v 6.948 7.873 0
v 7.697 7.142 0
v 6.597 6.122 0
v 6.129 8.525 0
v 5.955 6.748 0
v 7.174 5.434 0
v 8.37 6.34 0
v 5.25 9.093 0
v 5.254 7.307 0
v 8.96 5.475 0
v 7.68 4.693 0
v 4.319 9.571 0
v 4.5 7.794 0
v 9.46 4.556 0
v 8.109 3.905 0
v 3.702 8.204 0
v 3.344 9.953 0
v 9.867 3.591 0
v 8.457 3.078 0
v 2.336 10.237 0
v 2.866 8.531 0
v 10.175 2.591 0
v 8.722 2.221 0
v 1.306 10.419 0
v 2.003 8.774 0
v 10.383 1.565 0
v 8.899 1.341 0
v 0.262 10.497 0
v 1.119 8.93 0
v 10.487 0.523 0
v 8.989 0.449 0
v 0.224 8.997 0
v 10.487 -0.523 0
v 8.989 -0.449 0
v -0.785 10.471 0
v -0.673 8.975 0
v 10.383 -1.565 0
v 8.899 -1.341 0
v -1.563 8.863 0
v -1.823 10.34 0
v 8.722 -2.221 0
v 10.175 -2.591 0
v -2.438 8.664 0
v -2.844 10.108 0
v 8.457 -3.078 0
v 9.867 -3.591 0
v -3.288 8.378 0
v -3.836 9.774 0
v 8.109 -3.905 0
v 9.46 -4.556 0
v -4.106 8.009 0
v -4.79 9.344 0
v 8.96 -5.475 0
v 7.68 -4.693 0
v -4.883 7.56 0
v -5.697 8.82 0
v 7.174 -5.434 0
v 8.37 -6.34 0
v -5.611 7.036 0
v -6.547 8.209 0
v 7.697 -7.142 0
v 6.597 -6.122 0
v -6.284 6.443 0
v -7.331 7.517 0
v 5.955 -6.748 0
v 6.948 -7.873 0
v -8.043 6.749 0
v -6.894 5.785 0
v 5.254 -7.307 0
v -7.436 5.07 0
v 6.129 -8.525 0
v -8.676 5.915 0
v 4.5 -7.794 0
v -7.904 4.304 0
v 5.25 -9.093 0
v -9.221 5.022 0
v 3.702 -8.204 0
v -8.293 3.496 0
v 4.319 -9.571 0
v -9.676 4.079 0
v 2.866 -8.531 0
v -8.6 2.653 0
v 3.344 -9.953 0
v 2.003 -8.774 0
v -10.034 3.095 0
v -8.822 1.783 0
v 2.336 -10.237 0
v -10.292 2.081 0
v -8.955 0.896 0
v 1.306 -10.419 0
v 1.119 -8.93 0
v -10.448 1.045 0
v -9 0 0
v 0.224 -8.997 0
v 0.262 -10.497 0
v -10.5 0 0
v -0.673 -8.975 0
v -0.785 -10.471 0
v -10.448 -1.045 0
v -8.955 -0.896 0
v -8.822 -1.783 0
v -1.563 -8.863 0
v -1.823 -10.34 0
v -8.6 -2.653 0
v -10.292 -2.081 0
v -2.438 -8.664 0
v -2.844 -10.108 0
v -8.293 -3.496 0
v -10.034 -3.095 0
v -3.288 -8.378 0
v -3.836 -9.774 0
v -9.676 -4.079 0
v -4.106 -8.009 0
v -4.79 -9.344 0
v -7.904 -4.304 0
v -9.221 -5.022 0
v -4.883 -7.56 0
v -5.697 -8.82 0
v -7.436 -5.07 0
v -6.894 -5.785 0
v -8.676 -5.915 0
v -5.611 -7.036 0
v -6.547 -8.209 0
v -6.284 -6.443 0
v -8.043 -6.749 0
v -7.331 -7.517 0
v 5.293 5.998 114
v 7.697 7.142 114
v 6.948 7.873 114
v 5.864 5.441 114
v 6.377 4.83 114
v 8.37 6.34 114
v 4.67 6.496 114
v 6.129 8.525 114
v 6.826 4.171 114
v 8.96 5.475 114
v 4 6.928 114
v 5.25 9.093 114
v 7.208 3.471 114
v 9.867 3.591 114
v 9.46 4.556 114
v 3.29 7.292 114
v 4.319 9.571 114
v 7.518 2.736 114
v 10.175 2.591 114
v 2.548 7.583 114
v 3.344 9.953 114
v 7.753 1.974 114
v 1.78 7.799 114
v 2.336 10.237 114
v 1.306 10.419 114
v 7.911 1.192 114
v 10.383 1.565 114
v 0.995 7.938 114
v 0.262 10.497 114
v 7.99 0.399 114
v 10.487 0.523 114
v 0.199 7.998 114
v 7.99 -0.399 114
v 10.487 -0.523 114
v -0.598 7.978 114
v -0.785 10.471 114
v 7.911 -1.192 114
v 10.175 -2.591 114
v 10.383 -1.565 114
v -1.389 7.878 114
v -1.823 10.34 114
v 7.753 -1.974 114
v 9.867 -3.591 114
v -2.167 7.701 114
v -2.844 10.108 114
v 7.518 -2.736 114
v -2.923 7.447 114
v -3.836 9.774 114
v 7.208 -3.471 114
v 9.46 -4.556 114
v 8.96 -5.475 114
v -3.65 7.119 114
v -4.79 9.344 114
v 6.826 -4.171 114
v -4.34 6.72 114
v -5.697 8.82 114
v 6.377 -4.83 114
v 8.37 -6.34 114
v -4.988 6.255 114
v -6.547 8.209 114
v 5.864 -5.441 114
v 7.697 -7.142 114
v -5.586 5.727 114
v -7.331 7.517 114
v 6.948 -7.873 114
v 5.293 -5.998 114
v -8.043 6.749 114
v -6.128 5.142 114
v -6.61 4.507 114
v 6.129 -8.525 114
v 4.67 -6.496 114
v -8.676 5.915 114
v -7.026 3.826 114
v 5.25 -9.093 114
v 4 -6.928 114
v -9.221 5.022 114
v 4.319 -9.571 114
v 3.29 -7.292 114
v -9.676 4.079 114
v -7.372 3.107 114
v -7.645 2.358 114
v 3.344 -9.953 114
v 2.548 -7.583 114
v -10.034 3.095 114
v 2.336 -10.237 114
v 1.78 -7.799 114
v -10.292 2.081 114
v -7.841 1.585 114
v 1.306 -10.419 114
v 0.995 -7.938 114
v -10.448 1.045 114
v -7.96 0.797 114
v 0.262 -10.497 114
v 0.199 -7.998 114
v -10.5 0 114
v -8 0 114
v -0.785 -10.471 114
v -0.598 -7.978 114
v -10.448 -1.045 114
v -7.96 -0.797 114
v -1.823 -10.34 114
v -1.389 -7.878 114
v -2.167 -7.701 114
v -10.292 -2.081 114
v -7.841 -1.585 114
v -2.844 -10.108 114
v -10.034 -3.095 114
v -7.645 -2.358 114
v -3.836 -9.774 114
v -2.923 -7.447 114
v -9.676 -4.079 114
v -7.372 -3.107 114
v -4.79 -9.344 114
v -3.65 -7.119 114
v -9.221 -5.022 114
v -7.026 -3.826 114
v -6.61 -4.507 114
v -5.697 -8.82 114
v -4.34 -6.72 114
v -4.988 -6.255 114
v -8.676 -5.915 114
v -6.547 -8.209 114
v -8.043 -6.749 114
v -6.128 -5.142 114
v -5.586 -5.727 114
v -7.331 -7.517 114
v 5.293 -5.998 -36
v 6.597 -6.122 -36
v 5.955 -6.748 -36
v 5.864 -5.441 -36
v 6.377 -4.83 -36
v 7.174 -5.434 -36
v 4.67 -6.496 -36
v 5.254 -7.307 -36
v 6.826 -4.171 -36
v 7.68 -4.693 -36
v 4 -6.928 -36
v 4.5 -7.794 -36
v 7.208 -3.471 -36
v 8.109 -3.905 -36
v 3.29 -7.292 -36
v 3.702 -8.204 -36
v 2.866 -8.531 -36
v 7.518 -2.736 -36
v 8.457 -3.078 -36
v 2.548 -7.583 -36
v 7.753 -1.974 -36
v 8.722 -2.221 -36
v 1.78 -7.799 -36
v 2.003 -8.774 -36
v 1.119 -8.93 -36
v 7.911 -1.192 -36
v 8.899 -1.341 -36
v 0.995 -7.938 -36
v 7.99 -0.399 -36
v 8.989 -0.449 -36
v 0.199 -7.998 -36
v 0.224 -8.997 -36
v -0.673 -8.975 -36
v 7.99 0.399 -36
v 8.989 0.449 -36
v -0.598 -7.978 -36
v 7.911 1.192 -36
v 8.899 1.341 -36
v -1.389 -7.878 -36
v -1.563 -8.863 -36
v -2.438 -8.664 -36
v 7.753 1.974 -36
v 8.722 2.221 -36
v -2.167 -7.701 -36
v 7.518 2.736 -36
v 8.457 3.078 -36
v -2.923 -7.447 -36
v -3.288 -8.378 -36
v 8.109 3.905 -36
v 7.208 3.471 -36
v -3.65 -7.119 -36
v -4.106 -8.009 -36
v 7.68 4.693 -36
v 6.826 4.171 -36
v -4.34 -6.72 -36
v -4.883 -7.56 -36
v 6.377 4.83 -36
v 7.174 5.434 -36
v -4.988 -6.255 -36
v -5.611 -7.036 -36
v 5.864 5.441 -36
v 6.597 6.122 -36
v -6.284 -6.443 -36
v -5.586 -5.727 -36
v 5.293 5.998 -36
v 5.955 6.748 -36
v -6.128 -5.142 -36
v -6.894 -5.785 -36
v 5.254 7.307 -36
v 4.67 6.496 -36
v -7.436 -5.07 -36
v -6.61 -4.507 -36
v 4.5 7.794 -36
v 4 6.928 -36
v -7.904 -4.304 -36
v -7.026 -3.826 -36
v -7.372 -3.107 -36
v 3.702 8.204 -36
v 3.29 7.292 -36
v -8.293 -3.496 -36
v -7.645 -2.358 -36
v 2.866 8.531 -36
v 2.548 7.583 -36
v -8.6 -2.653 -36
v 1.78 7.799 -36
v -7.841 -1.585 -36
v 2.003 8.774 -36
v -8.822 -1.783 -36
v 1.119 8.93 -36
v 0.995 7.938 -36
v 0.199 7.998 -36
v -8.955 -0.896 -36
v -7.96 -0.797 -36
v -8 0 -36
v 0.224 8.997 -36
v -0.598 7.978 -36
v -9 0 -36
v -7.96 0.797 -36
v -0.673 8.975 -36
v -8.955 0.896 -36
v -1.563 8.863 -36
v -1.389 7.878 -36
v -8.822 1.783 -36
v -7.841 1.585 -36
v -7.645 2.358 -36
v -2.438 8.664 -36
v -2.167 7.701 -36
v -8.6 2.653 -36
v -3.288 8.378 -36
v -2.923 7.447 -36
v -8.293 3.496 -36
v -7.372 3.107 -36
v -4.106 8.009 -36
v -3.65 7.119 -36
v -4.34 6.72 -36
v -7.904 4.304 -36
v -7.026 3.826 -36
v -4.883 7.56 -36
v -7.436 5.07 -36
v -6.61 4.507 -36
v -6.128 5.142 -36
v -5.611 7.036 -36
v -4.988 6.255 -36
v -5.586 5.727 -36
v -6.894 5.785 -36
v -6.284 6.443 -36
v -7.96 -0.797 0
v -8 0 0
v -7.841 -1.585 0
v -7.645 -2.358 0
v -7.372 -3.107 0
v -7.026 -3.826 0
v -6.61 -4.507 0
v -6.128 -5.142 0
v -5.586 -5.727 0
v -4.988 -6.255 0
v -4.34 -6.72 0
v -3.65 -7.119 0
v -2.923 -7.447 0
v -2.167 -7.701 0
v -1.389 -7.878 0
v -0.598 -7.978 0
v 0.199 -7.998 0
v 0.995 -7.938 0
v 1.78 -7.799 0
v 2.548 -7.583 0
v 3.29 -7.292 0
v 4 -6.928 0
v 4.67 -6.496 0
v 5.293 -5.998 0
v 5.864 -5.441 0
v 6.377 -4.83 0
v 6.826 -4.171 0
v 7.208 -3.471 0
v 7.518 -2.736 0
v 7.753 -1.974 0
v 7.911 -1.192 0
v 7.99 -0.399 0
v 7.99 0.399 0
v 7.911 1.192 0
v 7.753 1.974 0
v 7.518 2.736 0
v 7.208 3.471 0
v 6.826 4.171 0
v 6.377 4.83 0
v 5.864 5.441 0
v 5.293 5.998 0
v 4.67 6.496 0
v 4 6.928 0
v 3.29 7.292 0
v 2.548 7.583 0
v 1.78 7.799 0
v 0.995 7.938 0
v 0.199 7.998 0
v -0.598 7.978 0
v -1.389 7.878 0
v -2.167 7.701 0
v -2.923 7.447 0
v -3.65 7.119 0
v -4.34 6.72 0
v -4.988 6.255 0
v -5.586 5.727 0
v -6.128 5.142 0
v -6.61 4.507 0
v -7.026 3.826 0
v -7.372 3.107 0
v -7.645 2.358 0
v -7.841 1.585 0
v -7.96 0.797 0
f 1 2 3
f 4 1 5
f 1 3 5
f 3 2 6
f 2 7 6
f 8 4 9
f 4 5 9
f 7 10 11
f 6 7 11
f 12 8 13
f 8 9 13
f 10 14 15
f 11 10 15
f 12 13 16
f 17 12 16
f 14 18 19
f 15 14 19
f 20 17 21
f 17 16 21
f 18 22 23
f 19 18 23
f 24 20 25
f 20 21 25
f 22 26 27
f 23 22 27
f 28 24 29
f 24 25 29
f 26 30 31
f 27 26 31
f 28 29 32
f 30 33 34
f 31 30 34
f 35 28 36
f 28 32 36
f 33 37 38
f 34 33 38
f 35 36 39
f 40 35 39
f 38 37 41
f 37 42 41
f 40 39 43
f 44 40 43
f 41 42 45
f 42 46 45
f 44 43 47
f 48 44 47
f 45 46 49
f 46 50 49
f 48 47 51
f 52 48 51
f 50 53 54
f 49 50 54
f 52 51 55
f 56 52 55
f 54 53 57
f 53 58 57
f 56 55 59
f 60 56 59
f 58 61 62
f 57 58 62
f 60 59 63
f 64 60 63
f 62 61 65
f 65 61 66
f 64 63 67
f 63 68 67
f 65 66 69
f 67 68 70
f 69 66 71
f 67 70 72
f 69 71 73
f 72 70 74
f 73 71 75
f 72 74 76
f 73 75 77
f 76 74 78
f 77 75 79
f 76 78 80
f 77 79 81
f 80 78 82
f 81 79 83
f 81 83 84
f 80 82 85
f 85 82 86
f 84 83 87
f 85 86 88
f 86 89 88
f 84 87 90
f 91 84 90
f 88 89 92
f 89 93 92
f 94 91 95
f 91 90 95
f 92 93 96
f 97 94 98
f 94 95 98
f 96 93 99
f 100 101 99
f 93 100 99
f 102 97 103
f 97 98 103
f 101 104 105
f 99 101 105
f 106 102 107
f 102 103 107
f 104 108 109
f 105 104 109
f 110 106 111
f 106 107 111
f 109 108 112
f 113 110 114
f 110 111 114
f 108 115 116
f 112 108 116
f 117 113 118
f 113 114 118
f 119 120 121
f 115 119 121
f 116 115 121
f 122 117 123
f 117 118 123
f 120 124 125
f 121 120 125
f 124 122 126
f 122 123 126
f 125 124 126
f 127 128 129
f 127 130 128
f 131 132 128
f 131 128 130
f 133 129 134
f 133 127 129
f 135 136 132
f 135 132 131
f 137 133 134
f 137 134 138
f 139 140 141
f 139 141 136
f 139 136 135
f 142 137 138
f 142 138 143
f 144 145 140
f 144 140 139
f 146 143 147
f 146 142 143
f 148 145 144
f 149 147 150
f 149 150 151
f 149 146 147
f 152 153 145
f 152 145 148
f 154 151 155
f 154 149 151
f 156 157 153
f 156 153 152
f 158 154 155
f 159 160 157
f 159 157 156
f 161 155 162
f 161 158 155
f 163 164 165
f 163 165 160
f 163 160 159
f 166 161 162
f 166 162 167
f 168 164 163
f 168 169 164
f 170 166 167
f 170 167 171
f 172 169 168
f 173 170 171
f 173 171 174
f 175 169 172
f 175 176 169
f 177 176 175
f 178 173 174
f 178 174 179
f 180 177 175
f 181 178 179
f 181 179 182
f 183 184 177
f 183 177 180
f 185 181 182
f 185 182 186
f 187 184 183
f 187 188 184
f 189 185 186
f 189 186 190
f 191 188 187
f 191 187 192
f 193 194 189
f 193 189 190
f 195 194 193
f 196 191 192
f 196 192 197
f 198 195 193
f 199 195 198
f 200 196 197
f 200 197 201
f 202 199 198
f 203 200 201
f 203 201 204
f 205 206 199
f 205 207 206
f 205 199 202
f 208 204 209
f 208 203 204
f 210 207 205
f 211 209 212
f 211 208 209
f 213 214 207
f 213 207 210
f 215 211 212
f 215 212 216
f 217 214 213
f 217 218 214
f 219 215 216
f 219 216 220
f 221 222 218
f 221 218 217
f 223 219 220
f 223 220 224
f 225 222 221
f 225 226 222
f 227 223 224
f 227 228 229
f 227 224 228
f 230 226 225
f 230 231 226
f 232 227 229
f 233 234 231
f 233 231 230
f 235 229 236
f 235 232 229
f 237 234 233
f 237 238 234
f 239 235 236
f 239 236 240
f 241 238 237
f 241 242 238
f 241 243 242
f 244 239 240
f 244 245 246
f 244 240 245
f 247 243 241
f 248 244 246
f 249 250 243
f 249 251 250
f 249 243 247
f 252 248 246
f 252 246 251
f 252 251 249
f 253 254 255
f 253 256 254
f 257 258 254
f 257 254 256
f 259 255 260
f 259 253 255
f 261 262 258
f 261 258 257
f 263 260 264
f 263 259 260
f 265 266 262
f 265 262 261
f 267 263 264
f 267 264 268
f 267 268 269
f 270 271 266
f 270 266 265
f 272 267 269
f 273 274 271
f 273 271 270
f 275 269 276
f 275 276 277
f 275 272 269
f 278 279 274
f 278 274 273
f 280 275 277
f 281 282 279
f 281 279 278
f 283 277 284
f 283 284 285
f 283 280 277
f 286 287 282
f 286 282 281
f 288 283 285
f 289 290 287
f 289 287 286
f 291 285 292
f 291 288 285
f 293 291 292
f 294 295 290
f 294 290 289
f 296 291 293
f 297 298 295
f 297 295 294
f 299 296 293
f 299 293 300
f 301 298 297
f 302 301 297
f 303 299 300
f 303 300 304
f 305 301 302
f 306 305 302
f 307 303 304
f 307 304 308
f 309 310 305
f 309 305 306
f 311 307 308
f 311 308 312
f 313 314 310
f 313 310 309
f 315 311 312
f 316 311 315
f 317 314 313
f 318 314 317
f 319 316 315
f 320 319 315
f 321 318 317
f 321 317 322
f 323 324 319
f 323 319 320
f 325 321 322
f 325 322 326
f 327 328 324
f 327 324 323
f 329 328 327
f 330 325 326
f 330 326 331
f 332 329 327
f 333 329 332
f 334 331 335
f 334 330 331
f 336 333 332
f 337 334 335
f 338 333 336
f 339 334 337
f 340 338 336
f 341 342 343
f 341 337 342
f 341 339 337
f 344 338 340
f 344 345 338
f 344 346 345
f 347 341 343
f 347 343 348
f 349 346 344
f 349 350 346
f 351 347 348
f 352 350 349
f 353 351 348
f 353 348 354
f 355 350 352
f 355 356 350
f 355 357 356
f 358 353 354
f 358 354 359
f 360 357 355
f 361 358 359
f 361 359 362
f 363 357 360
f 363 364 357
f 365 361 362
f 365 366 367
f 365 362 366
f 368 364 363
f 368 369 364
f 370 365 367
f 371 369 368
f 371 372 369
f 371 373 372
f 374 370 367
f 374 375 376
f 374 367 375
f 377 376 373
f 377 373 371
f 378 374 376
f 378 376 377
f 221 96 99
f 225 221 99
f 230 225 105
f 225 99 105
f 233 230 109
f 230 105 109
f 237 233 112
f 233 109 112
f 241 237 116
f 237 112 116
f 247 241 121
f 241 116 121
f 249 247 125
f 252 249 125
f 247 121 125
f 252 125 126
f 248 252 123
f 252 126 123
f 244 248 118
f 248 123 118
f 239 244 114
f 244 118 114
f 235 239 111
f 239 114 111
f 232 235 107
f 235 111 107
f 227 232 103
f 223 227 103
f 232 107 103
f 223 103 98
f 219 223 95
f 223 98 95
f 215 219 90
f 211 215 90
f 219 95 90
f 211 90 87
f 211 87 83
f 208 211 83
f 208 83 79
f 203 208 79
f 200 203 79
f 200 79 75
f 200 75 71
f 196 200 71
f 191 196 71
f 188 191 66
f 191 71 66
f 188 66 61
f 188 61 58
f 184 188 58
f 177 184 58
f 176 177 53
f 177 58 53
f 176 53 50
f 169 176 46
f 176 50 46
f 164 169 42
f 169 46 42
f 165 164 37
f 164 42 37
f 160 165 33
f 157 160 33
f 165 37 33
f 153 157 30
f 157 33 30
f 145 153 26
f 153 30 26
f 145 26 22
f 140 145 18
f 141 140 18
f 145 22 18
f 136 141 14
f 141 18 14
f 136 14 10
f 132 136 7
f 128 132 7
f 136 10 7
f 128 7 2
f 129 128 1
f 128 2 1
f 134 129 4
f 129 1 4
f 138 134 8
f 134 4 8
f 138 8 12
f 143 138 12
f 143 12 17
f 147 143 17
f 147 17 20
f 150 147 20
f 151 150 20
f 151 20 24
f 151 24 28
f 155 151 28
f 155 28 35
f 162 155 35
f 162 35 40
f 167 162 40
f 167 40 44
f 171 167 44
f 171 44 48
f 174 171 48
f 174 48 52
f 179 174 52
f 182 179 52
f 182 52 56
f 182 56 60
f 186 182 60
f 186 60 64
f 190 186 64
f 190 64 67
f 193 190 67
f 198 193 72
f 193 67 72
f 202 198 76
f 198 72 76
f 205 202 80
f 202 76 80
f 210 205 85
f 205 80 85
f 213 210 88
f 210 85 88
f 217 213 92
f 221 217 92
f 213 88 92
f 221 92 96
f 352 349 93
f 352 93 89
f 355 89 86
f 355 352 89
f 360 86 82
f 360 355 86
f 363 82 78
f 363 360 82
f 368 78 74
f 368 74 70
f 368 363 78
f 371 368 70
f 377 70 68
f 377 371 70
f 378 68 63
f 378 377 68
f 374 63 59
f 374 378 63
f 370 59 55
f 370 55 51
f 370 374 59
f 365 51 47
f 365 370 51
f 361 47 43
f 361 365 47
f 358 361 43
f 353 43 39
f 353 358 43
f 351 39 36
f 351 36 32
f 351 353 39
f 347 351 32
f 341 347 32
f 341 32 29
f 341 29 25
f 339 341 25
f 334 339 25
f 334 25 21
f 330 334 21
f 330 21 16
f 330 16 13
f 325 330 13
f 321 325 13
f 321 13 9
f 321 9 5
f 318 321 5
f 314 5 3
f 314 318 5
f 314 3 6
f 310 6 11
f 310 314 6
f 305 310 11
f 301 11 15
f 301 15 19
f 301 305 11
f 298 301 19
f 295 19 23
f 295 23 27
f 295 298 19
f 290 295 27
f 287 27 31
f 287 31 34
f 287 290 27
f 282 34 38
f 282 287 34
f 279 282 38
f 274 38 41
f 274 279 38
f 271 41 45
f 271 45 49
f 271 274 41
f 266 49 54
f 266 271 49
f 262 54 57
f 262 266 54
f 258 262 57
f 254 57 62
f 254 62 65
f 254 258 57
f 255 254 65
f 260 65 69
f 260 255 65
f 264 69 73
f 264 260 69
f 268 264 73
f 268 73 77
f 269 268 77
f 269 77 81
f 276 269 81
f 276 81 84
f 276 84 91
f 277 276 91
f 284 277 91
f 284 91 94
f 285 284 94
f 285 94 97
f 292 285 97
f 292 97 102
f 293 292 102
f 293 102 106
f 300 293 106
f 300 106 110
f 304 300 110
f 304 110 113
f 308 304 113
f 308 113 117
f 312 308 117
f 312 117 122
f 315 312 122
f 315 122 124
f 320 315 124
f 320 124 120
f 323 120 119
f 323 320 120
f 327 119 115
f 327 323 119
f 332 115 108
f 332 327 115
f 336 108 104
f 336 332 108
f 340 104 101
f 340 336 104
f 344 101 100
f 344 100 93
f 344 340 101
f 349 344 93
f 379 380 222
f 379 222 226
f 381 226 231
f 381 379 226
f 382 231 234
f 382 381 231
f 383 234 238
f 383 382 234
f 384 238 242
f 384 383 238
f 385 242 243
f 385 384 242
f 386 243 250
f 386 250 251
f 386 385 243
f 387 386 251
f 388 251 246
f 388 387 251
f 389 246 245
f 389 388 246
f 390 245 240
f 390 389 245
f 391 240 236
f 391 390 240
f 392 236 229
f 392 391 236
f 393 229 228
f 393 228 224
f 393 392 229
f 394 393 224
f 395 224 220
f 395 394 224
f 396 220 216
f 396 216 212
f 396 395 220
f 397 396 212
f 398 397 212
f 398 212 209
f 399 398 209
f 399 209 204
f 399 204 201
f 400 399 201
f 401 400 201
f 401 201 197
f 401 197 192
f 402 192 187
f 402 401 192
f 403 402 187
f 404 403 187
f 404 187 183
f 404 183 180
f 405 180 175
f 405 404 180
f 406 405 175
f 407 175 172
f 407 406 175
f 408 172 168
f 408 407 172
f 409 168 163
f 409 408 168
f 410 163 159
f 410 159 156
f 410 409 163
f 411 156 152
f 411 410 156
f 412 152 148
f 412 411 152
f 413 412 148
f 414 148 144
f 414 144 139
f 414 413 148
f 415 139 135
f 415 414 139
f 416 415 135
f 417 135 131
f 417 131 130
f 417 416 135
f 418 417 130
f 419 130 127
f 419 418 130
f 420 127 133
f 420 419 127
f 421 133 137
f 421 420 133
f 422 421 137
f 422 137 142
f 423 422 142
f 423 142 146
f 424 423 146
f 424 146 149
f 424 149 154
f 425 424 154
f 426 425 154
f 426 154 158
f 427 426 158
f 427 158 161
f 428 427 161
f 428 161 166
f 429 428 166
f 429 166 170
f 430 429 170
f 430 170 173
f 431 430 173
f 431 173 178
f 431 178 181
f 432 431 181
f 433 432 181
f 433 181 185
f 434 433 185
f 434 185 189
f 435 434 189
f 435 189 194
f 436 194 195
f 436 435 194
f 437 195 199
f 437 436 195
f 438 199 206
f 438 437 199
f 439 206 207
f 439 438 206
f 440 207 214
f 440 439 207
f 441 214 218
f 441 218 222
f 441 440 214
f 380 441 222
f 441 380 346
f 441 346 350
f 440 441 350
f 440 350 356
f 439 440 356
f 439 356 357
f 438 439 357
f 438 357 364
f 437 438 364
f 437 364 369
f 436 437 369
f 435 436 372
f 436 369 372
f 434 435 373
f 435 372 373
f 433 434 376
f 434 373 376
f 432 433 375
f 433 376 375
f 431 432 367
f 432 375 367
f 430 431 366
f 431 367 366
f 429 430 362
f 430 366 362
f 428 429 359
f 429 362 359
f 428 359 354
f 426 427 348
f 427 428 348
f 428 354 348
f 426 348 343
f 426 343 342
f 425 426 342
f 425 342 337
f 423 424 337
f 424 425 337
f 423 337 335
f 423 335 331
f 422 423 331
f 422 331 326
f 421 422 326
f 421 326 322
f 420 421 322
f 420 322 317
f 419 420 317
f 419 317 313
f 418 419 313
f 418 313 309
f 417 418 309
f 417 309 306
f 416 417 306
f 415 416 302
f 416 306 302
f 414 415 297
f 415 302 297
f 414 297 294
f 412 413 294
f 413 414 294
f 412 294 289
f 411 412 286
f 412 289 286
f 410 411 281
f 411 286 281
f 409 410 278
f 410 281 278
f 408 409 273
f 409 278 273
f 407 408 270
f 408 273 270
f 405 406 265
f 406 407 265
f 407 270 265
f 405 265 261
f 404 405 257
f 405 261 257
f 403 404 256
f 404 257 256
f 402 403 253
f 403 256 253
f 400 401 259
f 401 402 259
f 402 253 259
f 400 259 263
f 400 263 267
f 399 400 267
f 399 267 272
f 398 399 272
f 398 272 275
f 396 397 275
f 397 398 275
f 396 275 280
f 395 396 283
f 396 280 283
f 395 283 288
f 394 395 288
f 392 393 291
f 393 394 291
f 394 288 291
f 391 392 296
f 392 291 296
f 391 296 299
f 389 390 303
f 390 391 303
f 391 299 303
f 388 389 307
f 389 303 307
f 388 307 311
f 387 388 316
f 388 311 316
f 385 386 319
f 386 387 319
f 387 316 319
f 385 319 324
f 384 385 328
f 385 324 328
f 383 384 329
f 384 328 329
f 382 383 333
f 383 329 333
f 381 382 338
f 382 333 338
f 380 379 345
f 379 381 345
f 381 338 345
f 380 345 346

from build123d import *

# Parameters (mm, degrees)
SKETCH2_R           = 10.5
SKETCH2_R_2         = 8
BOSS_EXTRUDE1_DEPTH = 114
BOSS_EXTRUDE2_START = 36
SKETCH4_R           = 9
SKETCH4_R_2         = 8
BOSS_EXTRUDE2_DEPTH = 36


with BuildPart() as part:
    # Sketch2 → Boss-Extrude1 (new body)
    with BuildSketch(Plane.XY):
        with Locations(Location((0, 0, 0), (0, 0, 180))):
            Circle(SKETCH2_R)
        with Locations(Location((0, 0, 0), (0, 0, 180))):
            Circle(SKETCH2_R_2, mode=Mode.SUBTRACT)
    extrude(amount=BOSS_EXTRUDE1_DEPTH)

    # Sketch4 → Boss-Extrude2 (add)
    with BuildSketch(Plane(origin=(0, 0, 0), x_dir=(-1, 0, 0), z_dir=(0, 0, -1)).offset(BOSS_EXTRUDE2_START)):
        Circle(SKETCH4_R)
        Circle(SKETCH4_R_2, mode=Mode.SUBTRACT)
    extrude(amount=-BOSS_EXTRUDE2_DEPTH)


solid = part.part
